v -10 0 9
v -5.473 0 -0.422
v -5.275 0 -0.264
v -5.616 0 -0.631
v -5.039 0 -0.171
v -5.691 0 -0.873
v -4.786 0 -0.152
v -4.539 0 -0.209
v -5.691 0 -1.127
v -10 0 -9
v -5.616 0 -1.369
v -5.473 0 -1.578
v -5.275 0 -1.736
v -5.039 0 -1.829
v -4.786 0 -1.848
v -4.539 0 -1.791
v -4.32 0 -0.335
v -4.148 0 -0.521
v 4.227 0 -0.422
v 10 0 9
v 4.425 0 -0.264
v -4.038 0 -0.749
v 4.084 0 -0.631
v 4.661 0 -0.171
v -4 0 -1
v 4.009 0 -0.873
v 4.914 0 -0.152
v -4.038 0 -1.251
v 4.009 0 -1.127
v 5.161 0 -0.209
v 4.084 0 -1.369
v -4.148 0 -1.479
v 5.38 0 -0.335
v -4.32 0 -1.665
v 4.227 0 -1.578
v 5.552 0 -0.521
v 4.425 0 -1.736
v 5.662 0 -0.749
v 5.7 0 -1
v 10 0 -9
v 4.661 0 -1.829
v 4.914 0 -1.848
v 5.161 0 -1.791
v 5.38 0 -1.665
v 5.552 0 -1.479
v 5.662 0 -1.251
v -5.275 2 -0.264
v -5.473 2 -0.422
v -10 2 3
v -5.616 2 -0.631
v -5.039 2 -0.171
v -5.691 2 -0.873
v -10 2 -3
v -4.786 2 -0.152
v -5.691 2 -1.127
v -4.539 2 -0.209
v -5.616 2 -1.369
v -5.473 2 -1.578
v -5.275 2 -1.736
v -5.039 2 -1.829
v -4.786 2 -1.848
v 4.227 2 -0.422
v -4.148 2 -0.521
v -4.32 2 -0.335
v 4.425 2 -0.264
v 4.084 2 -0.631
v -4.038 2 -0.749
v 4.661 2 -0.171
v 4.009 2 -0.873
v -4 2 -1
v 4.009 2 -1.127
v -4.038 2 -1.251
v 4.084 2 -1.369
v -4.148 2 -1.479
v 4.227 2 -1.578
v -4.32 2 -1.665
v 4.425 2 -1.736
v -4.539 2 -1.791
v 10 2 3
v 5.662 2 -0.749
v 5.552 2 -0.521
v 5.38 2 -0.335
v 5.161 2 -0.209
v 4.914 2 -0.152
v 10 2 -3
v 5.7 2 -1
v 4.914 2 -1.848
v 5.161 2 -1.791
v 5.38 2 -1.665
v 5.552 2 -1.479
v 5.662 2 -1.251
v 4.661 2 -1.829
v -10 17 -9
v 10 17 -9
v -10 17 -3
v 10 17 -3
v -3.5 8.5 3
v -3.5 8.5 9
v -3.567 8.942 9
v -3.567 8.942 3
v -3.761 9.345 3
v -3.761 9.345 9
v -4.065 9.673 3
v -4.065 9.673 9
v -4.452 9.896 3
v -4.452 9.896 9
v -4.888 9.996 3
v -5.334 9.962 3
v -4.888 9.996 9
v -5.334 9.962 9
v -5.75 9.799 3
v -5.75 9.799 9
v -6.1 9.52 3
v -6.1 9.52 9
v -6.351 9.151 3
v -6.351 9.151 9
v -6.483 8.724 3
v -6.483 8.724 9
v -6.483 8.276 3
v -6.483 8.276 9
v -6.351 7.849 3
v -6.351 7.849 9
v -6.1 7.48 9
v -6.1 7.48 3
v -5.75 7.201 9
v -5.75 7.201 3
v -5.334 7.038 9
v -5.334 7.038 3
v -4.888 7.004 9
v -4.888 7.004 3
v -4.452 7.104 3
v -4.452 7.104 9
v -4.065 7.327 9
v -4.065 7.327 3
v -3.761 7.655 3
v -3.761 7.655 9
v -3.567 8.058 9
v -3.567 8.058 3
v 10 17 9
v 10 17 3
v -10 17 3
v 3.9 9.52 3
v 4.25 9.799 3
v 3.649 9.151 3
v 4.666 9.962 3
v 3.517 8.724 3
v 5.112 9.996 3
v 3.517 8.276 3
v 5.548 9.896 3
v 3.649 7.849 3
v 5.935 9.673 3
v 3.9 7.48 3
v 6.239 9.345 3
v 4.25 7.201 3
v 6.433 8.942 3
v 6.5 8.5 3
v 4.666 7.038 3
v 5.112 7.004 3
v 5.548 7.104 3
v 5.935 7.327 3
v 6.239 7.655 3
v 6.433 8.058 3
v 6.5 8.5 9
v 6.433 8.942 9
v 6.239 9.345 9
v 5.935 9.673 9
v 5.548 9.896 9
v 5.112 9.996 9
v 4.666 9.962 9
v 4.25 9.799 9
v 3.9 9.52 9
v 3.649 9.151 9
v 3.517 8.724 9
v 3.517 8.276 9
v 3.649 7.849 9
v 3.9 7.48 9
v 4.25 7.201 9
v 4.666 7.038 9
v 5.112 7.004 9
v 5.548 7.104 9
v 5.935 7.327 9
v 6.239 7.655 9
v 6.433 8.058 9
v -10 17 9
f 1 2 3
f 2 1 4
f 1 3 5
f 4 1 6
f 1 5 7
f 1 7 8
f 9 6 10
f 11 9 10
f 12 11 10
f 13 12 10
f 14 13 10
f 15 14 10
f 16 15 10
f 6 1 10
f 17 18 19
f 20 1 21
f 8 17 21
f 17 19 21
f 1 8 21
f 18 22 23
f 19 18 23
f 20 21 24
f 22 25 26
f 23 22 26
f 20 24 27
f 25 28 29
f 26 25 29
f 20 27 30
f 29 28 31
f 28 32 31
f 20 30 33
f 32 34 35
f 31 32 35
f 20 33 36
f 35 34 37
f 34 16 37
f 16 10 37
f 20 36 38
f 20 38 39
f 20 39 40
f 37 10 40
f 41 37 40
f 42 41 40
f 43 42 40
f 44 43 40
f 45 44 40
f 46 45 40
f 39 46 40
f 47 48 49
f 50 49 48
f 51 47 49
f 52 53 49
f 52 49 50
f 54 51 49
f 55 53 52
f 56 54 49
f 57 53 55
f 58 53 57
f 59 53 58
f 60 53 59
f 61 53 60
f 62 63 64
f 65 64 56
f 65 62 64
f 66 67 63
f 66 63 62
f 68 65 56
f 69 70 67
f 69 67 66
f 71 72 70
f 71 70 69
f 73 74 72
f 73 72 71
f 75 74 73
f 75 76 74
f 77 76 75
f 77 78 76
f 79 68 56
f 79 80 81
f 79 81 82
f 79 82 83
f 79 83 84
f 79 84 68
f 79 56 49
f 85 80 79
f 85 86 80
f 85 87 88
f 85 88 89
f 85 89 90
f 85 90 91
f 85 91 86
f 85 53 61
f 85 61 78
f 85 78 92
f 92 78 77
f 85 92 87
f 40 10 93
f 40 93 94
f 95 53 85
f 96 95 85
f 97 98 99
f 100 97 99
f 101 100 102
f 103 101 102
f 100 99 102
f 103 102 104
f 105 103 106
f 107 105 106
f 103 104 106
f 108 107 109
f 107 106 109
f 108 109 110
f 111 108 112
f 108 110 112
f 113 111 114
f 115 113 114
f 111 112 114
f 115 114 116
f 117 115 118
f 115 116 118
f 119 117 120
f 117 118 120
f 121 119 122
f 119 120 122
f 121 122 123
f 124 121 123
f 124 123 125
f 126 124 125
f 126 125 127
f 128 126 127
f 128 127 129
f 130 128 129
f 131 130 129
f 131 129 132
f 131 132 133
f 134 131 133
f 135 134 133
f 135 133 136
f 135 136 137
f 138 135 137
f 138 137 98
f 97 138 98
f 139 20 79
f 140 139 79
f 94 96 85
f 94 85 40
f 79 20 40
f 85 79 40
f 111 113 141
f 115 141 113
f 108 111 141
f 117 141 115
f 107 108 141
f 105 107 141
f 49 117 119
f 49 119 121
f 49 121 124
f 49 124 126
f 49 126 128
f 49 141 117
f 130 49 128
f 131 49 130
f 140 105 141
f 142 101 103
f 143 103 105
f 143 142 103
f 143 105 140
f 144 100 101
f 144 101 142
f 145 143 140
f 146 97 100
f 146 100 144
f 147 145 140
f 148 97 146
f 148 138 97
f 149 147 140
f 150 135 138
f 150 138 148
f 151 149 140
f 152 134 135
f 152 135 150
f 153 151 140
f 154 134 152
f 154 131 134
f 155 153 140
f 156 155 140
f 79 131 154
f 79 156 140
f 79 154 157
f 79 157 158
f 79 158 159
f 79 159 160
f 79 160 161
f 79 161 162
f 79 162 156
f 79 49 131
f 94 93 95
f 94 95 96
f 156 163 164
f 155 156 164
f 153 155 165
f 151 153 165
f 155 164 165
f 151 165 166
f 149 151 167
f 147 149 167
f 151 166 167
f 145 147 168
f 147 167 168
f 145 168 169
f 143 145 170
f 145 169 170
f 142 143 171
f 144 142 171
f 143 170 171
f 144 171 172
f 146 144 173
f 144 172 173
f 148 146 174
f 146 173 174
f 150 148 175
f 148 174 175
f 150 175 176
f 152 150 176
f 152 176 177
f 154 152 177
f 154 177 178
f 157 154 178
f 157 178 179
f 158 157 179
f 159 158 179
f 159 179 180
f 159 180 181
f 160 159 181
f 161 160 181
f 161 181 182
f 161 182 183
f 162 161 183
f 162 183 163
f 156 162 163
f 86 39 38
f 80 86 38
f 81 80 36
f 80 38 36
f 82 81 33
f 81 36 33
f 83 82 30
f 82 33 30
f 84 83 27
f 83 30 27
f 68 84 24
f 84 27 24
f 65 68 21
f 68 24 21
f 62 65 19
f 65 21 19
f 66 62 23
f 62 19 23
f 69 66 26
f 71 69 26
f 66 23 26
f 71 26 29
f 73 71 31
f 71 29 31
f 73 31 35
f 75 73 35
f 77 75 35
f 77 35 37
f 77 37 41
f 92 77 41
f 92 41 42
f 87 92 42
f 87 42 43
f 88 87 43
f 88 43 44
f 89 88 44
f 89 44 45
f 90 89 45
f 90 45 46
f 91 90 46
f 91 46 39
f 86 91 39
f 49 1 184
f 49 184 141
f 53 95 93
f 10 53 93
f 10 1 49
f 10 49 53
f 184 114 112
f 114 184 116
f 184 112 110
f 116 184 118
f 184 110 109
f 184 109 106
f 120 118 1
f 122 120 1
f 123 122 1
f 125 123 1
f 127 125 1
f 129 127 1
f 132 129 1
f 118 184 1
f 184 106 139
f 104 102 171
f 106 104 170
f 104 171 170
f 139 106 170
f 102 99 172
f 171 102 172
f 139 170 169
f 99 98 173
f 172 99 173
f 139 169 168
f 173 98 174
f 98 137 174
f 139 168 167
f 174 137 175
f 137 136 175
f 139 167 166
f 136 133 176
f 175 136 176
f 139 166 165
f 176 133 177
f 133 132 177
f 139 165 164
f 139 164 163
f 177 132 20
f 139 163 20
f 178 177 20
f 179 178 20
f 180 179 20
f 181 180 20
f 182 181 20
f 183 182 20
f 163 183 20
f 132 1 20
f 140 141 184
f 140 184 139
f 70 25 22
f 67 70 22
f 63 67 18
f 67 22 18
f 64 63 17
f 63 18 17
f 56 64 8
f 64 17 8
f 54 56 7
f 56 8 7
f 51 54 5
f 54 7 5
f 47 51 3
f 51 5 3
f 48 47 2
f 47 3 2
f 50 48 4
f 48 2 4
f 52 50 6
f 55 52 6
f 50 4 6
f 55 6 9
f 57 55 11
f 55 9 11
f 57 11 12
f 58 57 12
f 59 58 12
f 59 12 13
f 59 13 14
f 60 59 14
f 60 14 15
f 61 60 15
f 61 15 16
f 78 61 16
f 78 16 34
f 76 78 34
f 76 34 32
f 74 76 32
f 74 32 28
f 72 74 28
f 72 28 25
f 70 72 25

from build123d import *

# Parameters (mm, degrees)
ESQUISSE1_W             = 20
ESQUISSE1_H             = 6
BOSS_EXTRU_1_DEPTH      = 2
ESQUISSE1_4_W           = 20
ESQUISSE1_4_H           = 6
BOSS_EXTRU_2_DEPTH      = 17
ESQUISSE1_5_W           = 20
ESQUISSE1_5_H           = 6
BOSS_EXTRU_3_DEPTH      = 17
ENL_V_MAT_EXTRU_1_REACH = 28.702
ESQUISSE2_R             = 1.5
ENL_V_MAT_EXTRU_2_REACH = 23.679
ESQUISSE3_R             = 0.85


with BuildPart() as part:
    # Esquisse1 → Boss.-Extru.1 (new body)
    with BuildSketch(Plane(origin=(0, 0, 0), x_dir=(1, 0, 0), z_dir=(0, 1, 0))):
        Rectangle(ESQUISSE1_W, ESQUISSE1_H)
    extrude(amount=BOSS_EXTRU_1_DEPTH)

    # Esquisse1<4> → Boss.-Extru.2 (add)
    with BuildSketch(Plane(origin=(0, 0, 0), x_dir=(1, 0, 0), z_dir=(0, 1, 0))):
        with Locations((0, -6)):
            Rectangle(ESQUISSE1_4_W, ESQUISSE1_4_H)
    extrude(amount=BOSS_EXTRU_2_DEPTH)

    # Esquisse1<5> → Boss.-Extru.3 (add)
    with BuildSketch(Plane(origin=(0, 0, 0), x_dir=(1, 0, 0), z_dir=(0, 1, 0))):
        with Locations((0, 6)):
            Rectangle(ESQUISSE1_5_W, ESQUISSE1_5_H)
    extrude(amount=BOSS_EXTRU_3_DEPTH)

    # Esquisse2 → Enlèv. mat.-Extru.1 (cut, up to next)
    with BuildSketch(Plane.XY.offset(9), mode=Mode.PRIVATE) as enl_v_mat_extru_1_sk1:
        with Locations((-5, 8.5)):
            Circle(ESQUISSE2_R)
    enl_v_mat_extru_1_tool1 = extrude(enl_v_mat_extru_1_sk1.sketch, amount=-ENL_V_MAT_EXTRU_1_REACH, mode=Mode.PRIVATE) & part.part
    # Esquisse2 → Enlèv. mat.-Extru.1 (cut, up to next)
    with BuildSketch(Plane.XY.offset(9), mode=Mode.PRIVATE) as enl_v_mat_extru_1_sk2:
        with Locations((5, 8.5)):
            Circle(ESQUISSE2_R)
    enl_v_mat_extru_1_tool2 = extrude(enl_v_mat_extru_1_sk2.sketch, amount=-ENL_V_MAT_EXTRU_1_REACH, mode=Mode.PRIVATE) & part.part
    add(enl_v_mat_extru_1_tool1.solids().sort_by_distance((-5, 8.5, 9))[0], mode=Mode.SUBTRACT)
    add(enl_v_mat_extru_1_tool2.solids().sort_by_distance((5, 8.5, 9))[0], mode=Mode.SUBTRACT)

    # Esquisse3 → Enlèv. mat.-Extru.2 (cut, up to next)
    with BuildSketch(Plane.XZ, mode=Mode.PRIVATE) as enl_v_mat_extru_2_sk1:
        with Locations((-4.85, -1)):
            Circle(ESQUISSE3_R)
    enl_v_mat_extru_2_tool1 = extrude(enl_v_mat_extru_2_sk1.sketch, amount=-ENL_V_MAT_EXTRU_2_REACH, mode=Mode.PRIVATE) & part.part
    # Esquisse3 → Enlèv. mat.-Extru.2 (cut, up to next)
    with BuildSketch(Plane.XZ, mode=Mode.PRIVATE) as enl_v_mat_extru_2_sk2:
        with Locations((4.85, -1)):
            Circle(ESQUISSE3_R)
    enl_v_mat_extru_2_tool2 = extrude(enl_v_mat_extru_2_sk2.sketch, amount=-ENL_V_MAT_EXTRU_2_REACH, mode=Mode.PRIVATE) & part.part
    add(enl_v_mat_extru_2_tool1.solids().sort_by_distance((-4.85, 0, -1))[0], mode=Mode.SUBTRACT)
    add(enl_v_mat_extru_2_tool2.solids().sort_by_distance((4.85, 0, -1))[0], mode=Mode.SUBTRACT)


solid = part.part
